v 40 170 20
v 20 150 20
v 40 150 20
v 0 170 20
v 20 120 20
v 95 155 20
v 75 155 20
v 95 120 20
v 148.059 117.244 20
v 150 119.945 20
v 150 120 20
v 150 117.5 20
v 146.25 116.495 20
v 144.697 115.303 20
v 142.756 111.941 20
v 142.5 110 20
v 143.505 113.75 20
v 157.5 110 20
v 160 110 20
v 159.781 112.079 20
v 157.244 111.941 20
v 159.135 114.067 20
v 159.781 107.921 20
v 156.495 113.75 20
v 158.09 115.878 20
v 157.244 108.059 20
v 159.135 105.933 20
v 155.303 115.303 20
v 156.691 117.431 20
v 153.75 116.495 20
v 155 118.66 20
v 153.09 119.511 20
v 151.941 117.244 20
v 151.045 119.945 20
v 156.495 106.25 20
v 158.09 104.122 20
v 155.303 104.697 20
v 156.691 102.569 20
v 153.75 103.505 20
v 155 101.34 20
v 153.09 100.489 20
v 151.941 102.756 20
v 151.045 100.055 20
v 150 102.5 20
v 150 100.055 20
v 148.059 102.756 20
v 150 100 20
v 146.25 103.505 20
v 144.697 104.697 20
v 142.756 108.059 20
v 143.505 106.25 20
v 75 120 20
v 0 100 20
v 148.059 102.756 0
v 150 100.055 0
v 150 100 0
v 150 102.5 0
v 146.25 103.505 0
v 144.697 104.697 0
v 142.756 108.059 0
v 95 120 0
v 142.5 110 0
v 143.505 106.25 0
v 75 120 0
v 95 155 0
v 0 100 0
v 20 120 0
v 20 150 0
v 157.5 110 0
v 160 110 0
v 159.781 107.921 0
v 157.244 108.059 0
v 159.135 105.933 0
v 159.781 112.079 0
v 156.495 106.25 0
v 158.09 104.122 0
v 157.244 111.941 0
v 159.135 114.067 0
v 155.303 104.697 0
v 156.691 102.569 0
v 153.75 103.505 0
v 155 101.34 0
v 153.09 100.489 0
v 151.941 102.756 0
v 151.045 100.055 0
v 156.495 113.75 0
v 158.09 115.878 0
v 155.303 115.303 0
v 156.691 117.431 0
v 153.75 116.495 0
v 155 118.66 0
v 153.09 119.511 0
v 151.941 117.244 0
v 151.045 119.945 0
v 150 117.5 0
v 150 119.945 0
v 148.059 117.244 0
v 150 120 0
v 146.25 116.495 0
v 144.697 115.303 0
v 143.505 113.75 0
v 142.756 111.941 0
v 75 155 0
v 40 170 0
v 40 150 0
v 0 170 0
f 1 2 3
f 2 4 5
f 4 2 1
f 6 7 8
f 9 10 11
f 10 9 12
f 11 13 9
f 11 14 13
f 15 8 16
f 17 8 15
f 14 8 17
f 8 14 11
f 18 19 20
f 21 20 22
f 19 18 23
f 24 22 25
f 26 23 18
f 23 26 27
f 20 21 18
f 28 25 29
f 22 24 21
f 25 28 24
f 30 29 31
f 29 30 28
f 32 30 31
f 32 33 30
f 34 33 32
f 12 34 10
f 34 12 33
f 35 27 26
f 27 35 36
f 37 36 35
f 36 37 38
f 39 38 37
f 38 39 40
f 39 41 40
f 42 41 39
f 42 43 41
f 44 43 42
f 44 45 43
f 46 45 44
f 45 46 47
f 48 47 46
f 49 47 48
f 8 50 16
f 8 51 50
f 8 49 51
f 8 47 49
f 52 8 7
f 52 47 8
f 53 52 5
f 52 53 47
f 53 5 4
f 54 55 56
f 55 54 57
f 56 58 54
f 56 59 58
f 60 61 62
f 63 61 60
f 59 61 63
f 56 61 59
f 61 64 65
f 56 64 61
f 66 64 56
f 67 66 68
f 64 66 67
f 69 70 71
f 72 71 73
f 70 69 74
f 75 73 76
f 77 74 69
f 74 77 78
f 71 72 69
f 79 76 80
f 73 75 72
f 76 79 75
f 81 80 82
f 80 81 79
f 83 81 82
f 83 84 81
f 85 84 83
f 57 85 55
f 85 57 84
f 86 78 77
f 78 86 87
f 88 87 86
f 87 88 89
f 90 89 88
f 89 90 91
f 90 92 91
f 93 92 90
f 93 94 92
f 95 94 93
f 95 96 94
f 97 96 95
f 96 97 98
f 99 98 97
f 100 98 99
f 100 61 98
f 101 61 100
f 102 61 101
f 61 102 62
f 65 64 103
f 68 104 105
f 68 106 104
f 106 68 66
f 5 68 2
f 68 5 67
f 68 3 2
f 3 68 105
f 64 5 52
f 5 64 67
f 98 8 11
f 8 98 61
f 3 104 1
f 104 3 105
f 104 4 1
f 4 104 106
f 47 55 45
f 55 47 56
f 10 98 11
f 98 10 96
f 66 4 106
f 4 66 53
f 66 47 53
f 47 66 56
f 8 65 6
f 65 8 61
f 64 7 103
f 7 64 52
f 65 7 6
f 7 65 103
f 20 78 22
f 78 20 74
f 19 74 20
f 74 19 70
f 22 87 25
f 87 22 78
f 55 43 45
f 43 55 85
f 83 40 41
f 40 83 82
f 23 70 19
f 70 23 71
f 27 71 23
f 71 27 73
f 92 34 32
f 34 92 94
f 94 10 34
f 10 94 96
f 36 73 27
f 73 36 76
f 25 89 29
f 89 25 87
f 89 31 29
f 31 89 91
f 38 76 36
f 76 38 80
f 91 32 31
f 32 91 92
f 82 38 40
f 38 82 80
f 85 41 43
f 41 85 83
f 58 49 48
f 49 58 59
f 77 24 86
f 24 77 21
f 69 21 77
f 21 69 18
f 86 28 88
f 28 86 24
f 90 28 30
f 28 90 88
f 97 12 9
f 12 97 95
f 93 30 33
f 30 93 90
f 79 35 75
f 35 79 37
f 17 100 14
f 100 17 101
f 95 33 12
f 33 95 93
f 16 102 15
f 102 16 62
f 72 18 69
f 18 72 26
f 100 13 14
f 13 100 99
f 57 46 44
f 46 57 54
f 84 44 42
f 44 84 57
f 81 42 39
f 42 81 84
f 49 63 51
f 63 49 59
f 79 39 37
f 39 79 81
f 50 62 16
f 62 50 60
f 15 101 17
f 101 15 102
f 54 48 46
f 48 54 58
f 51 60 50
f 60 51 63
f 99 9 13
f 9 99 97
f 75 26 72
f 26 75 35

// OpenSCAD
BAR_WIDTH = 20;
BAR_LENGTH = 150; // 6" 152.4
SINK_EDGE = 30; // 1.5" 38.1mm
OVERALL_WIDTH = 250;

// The hook.
module hook(){
    difference(){
        
        cube([BAR_LENGTH,BAR_WIDTH*2+SINK_EDGE,BAR_WIDTH]);
        
        translate([BAR_WIDTH,BAR_WIDTH,0]){
            
            cube([BAR_LENGTH,SINK_EDGE,BAR_WIDTH]);
            
            translate([BAR_WIDTH,SINK_EDGE,0]){
                cube([BAR_LENGTH,BAR_WIDTH,BAR_WIDTH]);
            }
        }
    }

    // The lower brace
    translate([BAR_LENGTH/2,BAR_WIDTH,0]){
        #cube([BAR_WIDTH,BAR_WIDTH+15,BAR_WIDTH]);
    }
}
/*
// Main hook & bar.
hook();

// The part the towel hangs on.
translate([BAR_LENGTH,BAR_WIDTH/2,0]){
    difference(){
        
        cylinder(r=BAR_WIDTH/2,h=OVERALL_WIDTH);
        
        translate([0,0,OVERALL_WIDTH-BAR_WIDTH]){
            difference(){
                cylinder(r=BAR_WIDTH/2,h=BAR_WIDTH);
                cylinder(r=(BAR_WIDTH/2)*.75,h=BAR_WIDTH);
            }
        }
    }
}
*/

// Secondary hook.
translate([0,100,0]){
    difference(){
        union(){
            hook();
            translate([BAR_LENGTH,BAR_WIDTH/2,0]){ 
                cylinder(r=BAR_WIDTH/2,h=BAR_WIDTH);
            }
        }
        translate([BAR_LENGTH,BAR_WIDTH/2,0]){ 
            cylinder(r=(BAR_WIDTH/2)*.75,h=BAR_WIDTH);
        }
    }
}
